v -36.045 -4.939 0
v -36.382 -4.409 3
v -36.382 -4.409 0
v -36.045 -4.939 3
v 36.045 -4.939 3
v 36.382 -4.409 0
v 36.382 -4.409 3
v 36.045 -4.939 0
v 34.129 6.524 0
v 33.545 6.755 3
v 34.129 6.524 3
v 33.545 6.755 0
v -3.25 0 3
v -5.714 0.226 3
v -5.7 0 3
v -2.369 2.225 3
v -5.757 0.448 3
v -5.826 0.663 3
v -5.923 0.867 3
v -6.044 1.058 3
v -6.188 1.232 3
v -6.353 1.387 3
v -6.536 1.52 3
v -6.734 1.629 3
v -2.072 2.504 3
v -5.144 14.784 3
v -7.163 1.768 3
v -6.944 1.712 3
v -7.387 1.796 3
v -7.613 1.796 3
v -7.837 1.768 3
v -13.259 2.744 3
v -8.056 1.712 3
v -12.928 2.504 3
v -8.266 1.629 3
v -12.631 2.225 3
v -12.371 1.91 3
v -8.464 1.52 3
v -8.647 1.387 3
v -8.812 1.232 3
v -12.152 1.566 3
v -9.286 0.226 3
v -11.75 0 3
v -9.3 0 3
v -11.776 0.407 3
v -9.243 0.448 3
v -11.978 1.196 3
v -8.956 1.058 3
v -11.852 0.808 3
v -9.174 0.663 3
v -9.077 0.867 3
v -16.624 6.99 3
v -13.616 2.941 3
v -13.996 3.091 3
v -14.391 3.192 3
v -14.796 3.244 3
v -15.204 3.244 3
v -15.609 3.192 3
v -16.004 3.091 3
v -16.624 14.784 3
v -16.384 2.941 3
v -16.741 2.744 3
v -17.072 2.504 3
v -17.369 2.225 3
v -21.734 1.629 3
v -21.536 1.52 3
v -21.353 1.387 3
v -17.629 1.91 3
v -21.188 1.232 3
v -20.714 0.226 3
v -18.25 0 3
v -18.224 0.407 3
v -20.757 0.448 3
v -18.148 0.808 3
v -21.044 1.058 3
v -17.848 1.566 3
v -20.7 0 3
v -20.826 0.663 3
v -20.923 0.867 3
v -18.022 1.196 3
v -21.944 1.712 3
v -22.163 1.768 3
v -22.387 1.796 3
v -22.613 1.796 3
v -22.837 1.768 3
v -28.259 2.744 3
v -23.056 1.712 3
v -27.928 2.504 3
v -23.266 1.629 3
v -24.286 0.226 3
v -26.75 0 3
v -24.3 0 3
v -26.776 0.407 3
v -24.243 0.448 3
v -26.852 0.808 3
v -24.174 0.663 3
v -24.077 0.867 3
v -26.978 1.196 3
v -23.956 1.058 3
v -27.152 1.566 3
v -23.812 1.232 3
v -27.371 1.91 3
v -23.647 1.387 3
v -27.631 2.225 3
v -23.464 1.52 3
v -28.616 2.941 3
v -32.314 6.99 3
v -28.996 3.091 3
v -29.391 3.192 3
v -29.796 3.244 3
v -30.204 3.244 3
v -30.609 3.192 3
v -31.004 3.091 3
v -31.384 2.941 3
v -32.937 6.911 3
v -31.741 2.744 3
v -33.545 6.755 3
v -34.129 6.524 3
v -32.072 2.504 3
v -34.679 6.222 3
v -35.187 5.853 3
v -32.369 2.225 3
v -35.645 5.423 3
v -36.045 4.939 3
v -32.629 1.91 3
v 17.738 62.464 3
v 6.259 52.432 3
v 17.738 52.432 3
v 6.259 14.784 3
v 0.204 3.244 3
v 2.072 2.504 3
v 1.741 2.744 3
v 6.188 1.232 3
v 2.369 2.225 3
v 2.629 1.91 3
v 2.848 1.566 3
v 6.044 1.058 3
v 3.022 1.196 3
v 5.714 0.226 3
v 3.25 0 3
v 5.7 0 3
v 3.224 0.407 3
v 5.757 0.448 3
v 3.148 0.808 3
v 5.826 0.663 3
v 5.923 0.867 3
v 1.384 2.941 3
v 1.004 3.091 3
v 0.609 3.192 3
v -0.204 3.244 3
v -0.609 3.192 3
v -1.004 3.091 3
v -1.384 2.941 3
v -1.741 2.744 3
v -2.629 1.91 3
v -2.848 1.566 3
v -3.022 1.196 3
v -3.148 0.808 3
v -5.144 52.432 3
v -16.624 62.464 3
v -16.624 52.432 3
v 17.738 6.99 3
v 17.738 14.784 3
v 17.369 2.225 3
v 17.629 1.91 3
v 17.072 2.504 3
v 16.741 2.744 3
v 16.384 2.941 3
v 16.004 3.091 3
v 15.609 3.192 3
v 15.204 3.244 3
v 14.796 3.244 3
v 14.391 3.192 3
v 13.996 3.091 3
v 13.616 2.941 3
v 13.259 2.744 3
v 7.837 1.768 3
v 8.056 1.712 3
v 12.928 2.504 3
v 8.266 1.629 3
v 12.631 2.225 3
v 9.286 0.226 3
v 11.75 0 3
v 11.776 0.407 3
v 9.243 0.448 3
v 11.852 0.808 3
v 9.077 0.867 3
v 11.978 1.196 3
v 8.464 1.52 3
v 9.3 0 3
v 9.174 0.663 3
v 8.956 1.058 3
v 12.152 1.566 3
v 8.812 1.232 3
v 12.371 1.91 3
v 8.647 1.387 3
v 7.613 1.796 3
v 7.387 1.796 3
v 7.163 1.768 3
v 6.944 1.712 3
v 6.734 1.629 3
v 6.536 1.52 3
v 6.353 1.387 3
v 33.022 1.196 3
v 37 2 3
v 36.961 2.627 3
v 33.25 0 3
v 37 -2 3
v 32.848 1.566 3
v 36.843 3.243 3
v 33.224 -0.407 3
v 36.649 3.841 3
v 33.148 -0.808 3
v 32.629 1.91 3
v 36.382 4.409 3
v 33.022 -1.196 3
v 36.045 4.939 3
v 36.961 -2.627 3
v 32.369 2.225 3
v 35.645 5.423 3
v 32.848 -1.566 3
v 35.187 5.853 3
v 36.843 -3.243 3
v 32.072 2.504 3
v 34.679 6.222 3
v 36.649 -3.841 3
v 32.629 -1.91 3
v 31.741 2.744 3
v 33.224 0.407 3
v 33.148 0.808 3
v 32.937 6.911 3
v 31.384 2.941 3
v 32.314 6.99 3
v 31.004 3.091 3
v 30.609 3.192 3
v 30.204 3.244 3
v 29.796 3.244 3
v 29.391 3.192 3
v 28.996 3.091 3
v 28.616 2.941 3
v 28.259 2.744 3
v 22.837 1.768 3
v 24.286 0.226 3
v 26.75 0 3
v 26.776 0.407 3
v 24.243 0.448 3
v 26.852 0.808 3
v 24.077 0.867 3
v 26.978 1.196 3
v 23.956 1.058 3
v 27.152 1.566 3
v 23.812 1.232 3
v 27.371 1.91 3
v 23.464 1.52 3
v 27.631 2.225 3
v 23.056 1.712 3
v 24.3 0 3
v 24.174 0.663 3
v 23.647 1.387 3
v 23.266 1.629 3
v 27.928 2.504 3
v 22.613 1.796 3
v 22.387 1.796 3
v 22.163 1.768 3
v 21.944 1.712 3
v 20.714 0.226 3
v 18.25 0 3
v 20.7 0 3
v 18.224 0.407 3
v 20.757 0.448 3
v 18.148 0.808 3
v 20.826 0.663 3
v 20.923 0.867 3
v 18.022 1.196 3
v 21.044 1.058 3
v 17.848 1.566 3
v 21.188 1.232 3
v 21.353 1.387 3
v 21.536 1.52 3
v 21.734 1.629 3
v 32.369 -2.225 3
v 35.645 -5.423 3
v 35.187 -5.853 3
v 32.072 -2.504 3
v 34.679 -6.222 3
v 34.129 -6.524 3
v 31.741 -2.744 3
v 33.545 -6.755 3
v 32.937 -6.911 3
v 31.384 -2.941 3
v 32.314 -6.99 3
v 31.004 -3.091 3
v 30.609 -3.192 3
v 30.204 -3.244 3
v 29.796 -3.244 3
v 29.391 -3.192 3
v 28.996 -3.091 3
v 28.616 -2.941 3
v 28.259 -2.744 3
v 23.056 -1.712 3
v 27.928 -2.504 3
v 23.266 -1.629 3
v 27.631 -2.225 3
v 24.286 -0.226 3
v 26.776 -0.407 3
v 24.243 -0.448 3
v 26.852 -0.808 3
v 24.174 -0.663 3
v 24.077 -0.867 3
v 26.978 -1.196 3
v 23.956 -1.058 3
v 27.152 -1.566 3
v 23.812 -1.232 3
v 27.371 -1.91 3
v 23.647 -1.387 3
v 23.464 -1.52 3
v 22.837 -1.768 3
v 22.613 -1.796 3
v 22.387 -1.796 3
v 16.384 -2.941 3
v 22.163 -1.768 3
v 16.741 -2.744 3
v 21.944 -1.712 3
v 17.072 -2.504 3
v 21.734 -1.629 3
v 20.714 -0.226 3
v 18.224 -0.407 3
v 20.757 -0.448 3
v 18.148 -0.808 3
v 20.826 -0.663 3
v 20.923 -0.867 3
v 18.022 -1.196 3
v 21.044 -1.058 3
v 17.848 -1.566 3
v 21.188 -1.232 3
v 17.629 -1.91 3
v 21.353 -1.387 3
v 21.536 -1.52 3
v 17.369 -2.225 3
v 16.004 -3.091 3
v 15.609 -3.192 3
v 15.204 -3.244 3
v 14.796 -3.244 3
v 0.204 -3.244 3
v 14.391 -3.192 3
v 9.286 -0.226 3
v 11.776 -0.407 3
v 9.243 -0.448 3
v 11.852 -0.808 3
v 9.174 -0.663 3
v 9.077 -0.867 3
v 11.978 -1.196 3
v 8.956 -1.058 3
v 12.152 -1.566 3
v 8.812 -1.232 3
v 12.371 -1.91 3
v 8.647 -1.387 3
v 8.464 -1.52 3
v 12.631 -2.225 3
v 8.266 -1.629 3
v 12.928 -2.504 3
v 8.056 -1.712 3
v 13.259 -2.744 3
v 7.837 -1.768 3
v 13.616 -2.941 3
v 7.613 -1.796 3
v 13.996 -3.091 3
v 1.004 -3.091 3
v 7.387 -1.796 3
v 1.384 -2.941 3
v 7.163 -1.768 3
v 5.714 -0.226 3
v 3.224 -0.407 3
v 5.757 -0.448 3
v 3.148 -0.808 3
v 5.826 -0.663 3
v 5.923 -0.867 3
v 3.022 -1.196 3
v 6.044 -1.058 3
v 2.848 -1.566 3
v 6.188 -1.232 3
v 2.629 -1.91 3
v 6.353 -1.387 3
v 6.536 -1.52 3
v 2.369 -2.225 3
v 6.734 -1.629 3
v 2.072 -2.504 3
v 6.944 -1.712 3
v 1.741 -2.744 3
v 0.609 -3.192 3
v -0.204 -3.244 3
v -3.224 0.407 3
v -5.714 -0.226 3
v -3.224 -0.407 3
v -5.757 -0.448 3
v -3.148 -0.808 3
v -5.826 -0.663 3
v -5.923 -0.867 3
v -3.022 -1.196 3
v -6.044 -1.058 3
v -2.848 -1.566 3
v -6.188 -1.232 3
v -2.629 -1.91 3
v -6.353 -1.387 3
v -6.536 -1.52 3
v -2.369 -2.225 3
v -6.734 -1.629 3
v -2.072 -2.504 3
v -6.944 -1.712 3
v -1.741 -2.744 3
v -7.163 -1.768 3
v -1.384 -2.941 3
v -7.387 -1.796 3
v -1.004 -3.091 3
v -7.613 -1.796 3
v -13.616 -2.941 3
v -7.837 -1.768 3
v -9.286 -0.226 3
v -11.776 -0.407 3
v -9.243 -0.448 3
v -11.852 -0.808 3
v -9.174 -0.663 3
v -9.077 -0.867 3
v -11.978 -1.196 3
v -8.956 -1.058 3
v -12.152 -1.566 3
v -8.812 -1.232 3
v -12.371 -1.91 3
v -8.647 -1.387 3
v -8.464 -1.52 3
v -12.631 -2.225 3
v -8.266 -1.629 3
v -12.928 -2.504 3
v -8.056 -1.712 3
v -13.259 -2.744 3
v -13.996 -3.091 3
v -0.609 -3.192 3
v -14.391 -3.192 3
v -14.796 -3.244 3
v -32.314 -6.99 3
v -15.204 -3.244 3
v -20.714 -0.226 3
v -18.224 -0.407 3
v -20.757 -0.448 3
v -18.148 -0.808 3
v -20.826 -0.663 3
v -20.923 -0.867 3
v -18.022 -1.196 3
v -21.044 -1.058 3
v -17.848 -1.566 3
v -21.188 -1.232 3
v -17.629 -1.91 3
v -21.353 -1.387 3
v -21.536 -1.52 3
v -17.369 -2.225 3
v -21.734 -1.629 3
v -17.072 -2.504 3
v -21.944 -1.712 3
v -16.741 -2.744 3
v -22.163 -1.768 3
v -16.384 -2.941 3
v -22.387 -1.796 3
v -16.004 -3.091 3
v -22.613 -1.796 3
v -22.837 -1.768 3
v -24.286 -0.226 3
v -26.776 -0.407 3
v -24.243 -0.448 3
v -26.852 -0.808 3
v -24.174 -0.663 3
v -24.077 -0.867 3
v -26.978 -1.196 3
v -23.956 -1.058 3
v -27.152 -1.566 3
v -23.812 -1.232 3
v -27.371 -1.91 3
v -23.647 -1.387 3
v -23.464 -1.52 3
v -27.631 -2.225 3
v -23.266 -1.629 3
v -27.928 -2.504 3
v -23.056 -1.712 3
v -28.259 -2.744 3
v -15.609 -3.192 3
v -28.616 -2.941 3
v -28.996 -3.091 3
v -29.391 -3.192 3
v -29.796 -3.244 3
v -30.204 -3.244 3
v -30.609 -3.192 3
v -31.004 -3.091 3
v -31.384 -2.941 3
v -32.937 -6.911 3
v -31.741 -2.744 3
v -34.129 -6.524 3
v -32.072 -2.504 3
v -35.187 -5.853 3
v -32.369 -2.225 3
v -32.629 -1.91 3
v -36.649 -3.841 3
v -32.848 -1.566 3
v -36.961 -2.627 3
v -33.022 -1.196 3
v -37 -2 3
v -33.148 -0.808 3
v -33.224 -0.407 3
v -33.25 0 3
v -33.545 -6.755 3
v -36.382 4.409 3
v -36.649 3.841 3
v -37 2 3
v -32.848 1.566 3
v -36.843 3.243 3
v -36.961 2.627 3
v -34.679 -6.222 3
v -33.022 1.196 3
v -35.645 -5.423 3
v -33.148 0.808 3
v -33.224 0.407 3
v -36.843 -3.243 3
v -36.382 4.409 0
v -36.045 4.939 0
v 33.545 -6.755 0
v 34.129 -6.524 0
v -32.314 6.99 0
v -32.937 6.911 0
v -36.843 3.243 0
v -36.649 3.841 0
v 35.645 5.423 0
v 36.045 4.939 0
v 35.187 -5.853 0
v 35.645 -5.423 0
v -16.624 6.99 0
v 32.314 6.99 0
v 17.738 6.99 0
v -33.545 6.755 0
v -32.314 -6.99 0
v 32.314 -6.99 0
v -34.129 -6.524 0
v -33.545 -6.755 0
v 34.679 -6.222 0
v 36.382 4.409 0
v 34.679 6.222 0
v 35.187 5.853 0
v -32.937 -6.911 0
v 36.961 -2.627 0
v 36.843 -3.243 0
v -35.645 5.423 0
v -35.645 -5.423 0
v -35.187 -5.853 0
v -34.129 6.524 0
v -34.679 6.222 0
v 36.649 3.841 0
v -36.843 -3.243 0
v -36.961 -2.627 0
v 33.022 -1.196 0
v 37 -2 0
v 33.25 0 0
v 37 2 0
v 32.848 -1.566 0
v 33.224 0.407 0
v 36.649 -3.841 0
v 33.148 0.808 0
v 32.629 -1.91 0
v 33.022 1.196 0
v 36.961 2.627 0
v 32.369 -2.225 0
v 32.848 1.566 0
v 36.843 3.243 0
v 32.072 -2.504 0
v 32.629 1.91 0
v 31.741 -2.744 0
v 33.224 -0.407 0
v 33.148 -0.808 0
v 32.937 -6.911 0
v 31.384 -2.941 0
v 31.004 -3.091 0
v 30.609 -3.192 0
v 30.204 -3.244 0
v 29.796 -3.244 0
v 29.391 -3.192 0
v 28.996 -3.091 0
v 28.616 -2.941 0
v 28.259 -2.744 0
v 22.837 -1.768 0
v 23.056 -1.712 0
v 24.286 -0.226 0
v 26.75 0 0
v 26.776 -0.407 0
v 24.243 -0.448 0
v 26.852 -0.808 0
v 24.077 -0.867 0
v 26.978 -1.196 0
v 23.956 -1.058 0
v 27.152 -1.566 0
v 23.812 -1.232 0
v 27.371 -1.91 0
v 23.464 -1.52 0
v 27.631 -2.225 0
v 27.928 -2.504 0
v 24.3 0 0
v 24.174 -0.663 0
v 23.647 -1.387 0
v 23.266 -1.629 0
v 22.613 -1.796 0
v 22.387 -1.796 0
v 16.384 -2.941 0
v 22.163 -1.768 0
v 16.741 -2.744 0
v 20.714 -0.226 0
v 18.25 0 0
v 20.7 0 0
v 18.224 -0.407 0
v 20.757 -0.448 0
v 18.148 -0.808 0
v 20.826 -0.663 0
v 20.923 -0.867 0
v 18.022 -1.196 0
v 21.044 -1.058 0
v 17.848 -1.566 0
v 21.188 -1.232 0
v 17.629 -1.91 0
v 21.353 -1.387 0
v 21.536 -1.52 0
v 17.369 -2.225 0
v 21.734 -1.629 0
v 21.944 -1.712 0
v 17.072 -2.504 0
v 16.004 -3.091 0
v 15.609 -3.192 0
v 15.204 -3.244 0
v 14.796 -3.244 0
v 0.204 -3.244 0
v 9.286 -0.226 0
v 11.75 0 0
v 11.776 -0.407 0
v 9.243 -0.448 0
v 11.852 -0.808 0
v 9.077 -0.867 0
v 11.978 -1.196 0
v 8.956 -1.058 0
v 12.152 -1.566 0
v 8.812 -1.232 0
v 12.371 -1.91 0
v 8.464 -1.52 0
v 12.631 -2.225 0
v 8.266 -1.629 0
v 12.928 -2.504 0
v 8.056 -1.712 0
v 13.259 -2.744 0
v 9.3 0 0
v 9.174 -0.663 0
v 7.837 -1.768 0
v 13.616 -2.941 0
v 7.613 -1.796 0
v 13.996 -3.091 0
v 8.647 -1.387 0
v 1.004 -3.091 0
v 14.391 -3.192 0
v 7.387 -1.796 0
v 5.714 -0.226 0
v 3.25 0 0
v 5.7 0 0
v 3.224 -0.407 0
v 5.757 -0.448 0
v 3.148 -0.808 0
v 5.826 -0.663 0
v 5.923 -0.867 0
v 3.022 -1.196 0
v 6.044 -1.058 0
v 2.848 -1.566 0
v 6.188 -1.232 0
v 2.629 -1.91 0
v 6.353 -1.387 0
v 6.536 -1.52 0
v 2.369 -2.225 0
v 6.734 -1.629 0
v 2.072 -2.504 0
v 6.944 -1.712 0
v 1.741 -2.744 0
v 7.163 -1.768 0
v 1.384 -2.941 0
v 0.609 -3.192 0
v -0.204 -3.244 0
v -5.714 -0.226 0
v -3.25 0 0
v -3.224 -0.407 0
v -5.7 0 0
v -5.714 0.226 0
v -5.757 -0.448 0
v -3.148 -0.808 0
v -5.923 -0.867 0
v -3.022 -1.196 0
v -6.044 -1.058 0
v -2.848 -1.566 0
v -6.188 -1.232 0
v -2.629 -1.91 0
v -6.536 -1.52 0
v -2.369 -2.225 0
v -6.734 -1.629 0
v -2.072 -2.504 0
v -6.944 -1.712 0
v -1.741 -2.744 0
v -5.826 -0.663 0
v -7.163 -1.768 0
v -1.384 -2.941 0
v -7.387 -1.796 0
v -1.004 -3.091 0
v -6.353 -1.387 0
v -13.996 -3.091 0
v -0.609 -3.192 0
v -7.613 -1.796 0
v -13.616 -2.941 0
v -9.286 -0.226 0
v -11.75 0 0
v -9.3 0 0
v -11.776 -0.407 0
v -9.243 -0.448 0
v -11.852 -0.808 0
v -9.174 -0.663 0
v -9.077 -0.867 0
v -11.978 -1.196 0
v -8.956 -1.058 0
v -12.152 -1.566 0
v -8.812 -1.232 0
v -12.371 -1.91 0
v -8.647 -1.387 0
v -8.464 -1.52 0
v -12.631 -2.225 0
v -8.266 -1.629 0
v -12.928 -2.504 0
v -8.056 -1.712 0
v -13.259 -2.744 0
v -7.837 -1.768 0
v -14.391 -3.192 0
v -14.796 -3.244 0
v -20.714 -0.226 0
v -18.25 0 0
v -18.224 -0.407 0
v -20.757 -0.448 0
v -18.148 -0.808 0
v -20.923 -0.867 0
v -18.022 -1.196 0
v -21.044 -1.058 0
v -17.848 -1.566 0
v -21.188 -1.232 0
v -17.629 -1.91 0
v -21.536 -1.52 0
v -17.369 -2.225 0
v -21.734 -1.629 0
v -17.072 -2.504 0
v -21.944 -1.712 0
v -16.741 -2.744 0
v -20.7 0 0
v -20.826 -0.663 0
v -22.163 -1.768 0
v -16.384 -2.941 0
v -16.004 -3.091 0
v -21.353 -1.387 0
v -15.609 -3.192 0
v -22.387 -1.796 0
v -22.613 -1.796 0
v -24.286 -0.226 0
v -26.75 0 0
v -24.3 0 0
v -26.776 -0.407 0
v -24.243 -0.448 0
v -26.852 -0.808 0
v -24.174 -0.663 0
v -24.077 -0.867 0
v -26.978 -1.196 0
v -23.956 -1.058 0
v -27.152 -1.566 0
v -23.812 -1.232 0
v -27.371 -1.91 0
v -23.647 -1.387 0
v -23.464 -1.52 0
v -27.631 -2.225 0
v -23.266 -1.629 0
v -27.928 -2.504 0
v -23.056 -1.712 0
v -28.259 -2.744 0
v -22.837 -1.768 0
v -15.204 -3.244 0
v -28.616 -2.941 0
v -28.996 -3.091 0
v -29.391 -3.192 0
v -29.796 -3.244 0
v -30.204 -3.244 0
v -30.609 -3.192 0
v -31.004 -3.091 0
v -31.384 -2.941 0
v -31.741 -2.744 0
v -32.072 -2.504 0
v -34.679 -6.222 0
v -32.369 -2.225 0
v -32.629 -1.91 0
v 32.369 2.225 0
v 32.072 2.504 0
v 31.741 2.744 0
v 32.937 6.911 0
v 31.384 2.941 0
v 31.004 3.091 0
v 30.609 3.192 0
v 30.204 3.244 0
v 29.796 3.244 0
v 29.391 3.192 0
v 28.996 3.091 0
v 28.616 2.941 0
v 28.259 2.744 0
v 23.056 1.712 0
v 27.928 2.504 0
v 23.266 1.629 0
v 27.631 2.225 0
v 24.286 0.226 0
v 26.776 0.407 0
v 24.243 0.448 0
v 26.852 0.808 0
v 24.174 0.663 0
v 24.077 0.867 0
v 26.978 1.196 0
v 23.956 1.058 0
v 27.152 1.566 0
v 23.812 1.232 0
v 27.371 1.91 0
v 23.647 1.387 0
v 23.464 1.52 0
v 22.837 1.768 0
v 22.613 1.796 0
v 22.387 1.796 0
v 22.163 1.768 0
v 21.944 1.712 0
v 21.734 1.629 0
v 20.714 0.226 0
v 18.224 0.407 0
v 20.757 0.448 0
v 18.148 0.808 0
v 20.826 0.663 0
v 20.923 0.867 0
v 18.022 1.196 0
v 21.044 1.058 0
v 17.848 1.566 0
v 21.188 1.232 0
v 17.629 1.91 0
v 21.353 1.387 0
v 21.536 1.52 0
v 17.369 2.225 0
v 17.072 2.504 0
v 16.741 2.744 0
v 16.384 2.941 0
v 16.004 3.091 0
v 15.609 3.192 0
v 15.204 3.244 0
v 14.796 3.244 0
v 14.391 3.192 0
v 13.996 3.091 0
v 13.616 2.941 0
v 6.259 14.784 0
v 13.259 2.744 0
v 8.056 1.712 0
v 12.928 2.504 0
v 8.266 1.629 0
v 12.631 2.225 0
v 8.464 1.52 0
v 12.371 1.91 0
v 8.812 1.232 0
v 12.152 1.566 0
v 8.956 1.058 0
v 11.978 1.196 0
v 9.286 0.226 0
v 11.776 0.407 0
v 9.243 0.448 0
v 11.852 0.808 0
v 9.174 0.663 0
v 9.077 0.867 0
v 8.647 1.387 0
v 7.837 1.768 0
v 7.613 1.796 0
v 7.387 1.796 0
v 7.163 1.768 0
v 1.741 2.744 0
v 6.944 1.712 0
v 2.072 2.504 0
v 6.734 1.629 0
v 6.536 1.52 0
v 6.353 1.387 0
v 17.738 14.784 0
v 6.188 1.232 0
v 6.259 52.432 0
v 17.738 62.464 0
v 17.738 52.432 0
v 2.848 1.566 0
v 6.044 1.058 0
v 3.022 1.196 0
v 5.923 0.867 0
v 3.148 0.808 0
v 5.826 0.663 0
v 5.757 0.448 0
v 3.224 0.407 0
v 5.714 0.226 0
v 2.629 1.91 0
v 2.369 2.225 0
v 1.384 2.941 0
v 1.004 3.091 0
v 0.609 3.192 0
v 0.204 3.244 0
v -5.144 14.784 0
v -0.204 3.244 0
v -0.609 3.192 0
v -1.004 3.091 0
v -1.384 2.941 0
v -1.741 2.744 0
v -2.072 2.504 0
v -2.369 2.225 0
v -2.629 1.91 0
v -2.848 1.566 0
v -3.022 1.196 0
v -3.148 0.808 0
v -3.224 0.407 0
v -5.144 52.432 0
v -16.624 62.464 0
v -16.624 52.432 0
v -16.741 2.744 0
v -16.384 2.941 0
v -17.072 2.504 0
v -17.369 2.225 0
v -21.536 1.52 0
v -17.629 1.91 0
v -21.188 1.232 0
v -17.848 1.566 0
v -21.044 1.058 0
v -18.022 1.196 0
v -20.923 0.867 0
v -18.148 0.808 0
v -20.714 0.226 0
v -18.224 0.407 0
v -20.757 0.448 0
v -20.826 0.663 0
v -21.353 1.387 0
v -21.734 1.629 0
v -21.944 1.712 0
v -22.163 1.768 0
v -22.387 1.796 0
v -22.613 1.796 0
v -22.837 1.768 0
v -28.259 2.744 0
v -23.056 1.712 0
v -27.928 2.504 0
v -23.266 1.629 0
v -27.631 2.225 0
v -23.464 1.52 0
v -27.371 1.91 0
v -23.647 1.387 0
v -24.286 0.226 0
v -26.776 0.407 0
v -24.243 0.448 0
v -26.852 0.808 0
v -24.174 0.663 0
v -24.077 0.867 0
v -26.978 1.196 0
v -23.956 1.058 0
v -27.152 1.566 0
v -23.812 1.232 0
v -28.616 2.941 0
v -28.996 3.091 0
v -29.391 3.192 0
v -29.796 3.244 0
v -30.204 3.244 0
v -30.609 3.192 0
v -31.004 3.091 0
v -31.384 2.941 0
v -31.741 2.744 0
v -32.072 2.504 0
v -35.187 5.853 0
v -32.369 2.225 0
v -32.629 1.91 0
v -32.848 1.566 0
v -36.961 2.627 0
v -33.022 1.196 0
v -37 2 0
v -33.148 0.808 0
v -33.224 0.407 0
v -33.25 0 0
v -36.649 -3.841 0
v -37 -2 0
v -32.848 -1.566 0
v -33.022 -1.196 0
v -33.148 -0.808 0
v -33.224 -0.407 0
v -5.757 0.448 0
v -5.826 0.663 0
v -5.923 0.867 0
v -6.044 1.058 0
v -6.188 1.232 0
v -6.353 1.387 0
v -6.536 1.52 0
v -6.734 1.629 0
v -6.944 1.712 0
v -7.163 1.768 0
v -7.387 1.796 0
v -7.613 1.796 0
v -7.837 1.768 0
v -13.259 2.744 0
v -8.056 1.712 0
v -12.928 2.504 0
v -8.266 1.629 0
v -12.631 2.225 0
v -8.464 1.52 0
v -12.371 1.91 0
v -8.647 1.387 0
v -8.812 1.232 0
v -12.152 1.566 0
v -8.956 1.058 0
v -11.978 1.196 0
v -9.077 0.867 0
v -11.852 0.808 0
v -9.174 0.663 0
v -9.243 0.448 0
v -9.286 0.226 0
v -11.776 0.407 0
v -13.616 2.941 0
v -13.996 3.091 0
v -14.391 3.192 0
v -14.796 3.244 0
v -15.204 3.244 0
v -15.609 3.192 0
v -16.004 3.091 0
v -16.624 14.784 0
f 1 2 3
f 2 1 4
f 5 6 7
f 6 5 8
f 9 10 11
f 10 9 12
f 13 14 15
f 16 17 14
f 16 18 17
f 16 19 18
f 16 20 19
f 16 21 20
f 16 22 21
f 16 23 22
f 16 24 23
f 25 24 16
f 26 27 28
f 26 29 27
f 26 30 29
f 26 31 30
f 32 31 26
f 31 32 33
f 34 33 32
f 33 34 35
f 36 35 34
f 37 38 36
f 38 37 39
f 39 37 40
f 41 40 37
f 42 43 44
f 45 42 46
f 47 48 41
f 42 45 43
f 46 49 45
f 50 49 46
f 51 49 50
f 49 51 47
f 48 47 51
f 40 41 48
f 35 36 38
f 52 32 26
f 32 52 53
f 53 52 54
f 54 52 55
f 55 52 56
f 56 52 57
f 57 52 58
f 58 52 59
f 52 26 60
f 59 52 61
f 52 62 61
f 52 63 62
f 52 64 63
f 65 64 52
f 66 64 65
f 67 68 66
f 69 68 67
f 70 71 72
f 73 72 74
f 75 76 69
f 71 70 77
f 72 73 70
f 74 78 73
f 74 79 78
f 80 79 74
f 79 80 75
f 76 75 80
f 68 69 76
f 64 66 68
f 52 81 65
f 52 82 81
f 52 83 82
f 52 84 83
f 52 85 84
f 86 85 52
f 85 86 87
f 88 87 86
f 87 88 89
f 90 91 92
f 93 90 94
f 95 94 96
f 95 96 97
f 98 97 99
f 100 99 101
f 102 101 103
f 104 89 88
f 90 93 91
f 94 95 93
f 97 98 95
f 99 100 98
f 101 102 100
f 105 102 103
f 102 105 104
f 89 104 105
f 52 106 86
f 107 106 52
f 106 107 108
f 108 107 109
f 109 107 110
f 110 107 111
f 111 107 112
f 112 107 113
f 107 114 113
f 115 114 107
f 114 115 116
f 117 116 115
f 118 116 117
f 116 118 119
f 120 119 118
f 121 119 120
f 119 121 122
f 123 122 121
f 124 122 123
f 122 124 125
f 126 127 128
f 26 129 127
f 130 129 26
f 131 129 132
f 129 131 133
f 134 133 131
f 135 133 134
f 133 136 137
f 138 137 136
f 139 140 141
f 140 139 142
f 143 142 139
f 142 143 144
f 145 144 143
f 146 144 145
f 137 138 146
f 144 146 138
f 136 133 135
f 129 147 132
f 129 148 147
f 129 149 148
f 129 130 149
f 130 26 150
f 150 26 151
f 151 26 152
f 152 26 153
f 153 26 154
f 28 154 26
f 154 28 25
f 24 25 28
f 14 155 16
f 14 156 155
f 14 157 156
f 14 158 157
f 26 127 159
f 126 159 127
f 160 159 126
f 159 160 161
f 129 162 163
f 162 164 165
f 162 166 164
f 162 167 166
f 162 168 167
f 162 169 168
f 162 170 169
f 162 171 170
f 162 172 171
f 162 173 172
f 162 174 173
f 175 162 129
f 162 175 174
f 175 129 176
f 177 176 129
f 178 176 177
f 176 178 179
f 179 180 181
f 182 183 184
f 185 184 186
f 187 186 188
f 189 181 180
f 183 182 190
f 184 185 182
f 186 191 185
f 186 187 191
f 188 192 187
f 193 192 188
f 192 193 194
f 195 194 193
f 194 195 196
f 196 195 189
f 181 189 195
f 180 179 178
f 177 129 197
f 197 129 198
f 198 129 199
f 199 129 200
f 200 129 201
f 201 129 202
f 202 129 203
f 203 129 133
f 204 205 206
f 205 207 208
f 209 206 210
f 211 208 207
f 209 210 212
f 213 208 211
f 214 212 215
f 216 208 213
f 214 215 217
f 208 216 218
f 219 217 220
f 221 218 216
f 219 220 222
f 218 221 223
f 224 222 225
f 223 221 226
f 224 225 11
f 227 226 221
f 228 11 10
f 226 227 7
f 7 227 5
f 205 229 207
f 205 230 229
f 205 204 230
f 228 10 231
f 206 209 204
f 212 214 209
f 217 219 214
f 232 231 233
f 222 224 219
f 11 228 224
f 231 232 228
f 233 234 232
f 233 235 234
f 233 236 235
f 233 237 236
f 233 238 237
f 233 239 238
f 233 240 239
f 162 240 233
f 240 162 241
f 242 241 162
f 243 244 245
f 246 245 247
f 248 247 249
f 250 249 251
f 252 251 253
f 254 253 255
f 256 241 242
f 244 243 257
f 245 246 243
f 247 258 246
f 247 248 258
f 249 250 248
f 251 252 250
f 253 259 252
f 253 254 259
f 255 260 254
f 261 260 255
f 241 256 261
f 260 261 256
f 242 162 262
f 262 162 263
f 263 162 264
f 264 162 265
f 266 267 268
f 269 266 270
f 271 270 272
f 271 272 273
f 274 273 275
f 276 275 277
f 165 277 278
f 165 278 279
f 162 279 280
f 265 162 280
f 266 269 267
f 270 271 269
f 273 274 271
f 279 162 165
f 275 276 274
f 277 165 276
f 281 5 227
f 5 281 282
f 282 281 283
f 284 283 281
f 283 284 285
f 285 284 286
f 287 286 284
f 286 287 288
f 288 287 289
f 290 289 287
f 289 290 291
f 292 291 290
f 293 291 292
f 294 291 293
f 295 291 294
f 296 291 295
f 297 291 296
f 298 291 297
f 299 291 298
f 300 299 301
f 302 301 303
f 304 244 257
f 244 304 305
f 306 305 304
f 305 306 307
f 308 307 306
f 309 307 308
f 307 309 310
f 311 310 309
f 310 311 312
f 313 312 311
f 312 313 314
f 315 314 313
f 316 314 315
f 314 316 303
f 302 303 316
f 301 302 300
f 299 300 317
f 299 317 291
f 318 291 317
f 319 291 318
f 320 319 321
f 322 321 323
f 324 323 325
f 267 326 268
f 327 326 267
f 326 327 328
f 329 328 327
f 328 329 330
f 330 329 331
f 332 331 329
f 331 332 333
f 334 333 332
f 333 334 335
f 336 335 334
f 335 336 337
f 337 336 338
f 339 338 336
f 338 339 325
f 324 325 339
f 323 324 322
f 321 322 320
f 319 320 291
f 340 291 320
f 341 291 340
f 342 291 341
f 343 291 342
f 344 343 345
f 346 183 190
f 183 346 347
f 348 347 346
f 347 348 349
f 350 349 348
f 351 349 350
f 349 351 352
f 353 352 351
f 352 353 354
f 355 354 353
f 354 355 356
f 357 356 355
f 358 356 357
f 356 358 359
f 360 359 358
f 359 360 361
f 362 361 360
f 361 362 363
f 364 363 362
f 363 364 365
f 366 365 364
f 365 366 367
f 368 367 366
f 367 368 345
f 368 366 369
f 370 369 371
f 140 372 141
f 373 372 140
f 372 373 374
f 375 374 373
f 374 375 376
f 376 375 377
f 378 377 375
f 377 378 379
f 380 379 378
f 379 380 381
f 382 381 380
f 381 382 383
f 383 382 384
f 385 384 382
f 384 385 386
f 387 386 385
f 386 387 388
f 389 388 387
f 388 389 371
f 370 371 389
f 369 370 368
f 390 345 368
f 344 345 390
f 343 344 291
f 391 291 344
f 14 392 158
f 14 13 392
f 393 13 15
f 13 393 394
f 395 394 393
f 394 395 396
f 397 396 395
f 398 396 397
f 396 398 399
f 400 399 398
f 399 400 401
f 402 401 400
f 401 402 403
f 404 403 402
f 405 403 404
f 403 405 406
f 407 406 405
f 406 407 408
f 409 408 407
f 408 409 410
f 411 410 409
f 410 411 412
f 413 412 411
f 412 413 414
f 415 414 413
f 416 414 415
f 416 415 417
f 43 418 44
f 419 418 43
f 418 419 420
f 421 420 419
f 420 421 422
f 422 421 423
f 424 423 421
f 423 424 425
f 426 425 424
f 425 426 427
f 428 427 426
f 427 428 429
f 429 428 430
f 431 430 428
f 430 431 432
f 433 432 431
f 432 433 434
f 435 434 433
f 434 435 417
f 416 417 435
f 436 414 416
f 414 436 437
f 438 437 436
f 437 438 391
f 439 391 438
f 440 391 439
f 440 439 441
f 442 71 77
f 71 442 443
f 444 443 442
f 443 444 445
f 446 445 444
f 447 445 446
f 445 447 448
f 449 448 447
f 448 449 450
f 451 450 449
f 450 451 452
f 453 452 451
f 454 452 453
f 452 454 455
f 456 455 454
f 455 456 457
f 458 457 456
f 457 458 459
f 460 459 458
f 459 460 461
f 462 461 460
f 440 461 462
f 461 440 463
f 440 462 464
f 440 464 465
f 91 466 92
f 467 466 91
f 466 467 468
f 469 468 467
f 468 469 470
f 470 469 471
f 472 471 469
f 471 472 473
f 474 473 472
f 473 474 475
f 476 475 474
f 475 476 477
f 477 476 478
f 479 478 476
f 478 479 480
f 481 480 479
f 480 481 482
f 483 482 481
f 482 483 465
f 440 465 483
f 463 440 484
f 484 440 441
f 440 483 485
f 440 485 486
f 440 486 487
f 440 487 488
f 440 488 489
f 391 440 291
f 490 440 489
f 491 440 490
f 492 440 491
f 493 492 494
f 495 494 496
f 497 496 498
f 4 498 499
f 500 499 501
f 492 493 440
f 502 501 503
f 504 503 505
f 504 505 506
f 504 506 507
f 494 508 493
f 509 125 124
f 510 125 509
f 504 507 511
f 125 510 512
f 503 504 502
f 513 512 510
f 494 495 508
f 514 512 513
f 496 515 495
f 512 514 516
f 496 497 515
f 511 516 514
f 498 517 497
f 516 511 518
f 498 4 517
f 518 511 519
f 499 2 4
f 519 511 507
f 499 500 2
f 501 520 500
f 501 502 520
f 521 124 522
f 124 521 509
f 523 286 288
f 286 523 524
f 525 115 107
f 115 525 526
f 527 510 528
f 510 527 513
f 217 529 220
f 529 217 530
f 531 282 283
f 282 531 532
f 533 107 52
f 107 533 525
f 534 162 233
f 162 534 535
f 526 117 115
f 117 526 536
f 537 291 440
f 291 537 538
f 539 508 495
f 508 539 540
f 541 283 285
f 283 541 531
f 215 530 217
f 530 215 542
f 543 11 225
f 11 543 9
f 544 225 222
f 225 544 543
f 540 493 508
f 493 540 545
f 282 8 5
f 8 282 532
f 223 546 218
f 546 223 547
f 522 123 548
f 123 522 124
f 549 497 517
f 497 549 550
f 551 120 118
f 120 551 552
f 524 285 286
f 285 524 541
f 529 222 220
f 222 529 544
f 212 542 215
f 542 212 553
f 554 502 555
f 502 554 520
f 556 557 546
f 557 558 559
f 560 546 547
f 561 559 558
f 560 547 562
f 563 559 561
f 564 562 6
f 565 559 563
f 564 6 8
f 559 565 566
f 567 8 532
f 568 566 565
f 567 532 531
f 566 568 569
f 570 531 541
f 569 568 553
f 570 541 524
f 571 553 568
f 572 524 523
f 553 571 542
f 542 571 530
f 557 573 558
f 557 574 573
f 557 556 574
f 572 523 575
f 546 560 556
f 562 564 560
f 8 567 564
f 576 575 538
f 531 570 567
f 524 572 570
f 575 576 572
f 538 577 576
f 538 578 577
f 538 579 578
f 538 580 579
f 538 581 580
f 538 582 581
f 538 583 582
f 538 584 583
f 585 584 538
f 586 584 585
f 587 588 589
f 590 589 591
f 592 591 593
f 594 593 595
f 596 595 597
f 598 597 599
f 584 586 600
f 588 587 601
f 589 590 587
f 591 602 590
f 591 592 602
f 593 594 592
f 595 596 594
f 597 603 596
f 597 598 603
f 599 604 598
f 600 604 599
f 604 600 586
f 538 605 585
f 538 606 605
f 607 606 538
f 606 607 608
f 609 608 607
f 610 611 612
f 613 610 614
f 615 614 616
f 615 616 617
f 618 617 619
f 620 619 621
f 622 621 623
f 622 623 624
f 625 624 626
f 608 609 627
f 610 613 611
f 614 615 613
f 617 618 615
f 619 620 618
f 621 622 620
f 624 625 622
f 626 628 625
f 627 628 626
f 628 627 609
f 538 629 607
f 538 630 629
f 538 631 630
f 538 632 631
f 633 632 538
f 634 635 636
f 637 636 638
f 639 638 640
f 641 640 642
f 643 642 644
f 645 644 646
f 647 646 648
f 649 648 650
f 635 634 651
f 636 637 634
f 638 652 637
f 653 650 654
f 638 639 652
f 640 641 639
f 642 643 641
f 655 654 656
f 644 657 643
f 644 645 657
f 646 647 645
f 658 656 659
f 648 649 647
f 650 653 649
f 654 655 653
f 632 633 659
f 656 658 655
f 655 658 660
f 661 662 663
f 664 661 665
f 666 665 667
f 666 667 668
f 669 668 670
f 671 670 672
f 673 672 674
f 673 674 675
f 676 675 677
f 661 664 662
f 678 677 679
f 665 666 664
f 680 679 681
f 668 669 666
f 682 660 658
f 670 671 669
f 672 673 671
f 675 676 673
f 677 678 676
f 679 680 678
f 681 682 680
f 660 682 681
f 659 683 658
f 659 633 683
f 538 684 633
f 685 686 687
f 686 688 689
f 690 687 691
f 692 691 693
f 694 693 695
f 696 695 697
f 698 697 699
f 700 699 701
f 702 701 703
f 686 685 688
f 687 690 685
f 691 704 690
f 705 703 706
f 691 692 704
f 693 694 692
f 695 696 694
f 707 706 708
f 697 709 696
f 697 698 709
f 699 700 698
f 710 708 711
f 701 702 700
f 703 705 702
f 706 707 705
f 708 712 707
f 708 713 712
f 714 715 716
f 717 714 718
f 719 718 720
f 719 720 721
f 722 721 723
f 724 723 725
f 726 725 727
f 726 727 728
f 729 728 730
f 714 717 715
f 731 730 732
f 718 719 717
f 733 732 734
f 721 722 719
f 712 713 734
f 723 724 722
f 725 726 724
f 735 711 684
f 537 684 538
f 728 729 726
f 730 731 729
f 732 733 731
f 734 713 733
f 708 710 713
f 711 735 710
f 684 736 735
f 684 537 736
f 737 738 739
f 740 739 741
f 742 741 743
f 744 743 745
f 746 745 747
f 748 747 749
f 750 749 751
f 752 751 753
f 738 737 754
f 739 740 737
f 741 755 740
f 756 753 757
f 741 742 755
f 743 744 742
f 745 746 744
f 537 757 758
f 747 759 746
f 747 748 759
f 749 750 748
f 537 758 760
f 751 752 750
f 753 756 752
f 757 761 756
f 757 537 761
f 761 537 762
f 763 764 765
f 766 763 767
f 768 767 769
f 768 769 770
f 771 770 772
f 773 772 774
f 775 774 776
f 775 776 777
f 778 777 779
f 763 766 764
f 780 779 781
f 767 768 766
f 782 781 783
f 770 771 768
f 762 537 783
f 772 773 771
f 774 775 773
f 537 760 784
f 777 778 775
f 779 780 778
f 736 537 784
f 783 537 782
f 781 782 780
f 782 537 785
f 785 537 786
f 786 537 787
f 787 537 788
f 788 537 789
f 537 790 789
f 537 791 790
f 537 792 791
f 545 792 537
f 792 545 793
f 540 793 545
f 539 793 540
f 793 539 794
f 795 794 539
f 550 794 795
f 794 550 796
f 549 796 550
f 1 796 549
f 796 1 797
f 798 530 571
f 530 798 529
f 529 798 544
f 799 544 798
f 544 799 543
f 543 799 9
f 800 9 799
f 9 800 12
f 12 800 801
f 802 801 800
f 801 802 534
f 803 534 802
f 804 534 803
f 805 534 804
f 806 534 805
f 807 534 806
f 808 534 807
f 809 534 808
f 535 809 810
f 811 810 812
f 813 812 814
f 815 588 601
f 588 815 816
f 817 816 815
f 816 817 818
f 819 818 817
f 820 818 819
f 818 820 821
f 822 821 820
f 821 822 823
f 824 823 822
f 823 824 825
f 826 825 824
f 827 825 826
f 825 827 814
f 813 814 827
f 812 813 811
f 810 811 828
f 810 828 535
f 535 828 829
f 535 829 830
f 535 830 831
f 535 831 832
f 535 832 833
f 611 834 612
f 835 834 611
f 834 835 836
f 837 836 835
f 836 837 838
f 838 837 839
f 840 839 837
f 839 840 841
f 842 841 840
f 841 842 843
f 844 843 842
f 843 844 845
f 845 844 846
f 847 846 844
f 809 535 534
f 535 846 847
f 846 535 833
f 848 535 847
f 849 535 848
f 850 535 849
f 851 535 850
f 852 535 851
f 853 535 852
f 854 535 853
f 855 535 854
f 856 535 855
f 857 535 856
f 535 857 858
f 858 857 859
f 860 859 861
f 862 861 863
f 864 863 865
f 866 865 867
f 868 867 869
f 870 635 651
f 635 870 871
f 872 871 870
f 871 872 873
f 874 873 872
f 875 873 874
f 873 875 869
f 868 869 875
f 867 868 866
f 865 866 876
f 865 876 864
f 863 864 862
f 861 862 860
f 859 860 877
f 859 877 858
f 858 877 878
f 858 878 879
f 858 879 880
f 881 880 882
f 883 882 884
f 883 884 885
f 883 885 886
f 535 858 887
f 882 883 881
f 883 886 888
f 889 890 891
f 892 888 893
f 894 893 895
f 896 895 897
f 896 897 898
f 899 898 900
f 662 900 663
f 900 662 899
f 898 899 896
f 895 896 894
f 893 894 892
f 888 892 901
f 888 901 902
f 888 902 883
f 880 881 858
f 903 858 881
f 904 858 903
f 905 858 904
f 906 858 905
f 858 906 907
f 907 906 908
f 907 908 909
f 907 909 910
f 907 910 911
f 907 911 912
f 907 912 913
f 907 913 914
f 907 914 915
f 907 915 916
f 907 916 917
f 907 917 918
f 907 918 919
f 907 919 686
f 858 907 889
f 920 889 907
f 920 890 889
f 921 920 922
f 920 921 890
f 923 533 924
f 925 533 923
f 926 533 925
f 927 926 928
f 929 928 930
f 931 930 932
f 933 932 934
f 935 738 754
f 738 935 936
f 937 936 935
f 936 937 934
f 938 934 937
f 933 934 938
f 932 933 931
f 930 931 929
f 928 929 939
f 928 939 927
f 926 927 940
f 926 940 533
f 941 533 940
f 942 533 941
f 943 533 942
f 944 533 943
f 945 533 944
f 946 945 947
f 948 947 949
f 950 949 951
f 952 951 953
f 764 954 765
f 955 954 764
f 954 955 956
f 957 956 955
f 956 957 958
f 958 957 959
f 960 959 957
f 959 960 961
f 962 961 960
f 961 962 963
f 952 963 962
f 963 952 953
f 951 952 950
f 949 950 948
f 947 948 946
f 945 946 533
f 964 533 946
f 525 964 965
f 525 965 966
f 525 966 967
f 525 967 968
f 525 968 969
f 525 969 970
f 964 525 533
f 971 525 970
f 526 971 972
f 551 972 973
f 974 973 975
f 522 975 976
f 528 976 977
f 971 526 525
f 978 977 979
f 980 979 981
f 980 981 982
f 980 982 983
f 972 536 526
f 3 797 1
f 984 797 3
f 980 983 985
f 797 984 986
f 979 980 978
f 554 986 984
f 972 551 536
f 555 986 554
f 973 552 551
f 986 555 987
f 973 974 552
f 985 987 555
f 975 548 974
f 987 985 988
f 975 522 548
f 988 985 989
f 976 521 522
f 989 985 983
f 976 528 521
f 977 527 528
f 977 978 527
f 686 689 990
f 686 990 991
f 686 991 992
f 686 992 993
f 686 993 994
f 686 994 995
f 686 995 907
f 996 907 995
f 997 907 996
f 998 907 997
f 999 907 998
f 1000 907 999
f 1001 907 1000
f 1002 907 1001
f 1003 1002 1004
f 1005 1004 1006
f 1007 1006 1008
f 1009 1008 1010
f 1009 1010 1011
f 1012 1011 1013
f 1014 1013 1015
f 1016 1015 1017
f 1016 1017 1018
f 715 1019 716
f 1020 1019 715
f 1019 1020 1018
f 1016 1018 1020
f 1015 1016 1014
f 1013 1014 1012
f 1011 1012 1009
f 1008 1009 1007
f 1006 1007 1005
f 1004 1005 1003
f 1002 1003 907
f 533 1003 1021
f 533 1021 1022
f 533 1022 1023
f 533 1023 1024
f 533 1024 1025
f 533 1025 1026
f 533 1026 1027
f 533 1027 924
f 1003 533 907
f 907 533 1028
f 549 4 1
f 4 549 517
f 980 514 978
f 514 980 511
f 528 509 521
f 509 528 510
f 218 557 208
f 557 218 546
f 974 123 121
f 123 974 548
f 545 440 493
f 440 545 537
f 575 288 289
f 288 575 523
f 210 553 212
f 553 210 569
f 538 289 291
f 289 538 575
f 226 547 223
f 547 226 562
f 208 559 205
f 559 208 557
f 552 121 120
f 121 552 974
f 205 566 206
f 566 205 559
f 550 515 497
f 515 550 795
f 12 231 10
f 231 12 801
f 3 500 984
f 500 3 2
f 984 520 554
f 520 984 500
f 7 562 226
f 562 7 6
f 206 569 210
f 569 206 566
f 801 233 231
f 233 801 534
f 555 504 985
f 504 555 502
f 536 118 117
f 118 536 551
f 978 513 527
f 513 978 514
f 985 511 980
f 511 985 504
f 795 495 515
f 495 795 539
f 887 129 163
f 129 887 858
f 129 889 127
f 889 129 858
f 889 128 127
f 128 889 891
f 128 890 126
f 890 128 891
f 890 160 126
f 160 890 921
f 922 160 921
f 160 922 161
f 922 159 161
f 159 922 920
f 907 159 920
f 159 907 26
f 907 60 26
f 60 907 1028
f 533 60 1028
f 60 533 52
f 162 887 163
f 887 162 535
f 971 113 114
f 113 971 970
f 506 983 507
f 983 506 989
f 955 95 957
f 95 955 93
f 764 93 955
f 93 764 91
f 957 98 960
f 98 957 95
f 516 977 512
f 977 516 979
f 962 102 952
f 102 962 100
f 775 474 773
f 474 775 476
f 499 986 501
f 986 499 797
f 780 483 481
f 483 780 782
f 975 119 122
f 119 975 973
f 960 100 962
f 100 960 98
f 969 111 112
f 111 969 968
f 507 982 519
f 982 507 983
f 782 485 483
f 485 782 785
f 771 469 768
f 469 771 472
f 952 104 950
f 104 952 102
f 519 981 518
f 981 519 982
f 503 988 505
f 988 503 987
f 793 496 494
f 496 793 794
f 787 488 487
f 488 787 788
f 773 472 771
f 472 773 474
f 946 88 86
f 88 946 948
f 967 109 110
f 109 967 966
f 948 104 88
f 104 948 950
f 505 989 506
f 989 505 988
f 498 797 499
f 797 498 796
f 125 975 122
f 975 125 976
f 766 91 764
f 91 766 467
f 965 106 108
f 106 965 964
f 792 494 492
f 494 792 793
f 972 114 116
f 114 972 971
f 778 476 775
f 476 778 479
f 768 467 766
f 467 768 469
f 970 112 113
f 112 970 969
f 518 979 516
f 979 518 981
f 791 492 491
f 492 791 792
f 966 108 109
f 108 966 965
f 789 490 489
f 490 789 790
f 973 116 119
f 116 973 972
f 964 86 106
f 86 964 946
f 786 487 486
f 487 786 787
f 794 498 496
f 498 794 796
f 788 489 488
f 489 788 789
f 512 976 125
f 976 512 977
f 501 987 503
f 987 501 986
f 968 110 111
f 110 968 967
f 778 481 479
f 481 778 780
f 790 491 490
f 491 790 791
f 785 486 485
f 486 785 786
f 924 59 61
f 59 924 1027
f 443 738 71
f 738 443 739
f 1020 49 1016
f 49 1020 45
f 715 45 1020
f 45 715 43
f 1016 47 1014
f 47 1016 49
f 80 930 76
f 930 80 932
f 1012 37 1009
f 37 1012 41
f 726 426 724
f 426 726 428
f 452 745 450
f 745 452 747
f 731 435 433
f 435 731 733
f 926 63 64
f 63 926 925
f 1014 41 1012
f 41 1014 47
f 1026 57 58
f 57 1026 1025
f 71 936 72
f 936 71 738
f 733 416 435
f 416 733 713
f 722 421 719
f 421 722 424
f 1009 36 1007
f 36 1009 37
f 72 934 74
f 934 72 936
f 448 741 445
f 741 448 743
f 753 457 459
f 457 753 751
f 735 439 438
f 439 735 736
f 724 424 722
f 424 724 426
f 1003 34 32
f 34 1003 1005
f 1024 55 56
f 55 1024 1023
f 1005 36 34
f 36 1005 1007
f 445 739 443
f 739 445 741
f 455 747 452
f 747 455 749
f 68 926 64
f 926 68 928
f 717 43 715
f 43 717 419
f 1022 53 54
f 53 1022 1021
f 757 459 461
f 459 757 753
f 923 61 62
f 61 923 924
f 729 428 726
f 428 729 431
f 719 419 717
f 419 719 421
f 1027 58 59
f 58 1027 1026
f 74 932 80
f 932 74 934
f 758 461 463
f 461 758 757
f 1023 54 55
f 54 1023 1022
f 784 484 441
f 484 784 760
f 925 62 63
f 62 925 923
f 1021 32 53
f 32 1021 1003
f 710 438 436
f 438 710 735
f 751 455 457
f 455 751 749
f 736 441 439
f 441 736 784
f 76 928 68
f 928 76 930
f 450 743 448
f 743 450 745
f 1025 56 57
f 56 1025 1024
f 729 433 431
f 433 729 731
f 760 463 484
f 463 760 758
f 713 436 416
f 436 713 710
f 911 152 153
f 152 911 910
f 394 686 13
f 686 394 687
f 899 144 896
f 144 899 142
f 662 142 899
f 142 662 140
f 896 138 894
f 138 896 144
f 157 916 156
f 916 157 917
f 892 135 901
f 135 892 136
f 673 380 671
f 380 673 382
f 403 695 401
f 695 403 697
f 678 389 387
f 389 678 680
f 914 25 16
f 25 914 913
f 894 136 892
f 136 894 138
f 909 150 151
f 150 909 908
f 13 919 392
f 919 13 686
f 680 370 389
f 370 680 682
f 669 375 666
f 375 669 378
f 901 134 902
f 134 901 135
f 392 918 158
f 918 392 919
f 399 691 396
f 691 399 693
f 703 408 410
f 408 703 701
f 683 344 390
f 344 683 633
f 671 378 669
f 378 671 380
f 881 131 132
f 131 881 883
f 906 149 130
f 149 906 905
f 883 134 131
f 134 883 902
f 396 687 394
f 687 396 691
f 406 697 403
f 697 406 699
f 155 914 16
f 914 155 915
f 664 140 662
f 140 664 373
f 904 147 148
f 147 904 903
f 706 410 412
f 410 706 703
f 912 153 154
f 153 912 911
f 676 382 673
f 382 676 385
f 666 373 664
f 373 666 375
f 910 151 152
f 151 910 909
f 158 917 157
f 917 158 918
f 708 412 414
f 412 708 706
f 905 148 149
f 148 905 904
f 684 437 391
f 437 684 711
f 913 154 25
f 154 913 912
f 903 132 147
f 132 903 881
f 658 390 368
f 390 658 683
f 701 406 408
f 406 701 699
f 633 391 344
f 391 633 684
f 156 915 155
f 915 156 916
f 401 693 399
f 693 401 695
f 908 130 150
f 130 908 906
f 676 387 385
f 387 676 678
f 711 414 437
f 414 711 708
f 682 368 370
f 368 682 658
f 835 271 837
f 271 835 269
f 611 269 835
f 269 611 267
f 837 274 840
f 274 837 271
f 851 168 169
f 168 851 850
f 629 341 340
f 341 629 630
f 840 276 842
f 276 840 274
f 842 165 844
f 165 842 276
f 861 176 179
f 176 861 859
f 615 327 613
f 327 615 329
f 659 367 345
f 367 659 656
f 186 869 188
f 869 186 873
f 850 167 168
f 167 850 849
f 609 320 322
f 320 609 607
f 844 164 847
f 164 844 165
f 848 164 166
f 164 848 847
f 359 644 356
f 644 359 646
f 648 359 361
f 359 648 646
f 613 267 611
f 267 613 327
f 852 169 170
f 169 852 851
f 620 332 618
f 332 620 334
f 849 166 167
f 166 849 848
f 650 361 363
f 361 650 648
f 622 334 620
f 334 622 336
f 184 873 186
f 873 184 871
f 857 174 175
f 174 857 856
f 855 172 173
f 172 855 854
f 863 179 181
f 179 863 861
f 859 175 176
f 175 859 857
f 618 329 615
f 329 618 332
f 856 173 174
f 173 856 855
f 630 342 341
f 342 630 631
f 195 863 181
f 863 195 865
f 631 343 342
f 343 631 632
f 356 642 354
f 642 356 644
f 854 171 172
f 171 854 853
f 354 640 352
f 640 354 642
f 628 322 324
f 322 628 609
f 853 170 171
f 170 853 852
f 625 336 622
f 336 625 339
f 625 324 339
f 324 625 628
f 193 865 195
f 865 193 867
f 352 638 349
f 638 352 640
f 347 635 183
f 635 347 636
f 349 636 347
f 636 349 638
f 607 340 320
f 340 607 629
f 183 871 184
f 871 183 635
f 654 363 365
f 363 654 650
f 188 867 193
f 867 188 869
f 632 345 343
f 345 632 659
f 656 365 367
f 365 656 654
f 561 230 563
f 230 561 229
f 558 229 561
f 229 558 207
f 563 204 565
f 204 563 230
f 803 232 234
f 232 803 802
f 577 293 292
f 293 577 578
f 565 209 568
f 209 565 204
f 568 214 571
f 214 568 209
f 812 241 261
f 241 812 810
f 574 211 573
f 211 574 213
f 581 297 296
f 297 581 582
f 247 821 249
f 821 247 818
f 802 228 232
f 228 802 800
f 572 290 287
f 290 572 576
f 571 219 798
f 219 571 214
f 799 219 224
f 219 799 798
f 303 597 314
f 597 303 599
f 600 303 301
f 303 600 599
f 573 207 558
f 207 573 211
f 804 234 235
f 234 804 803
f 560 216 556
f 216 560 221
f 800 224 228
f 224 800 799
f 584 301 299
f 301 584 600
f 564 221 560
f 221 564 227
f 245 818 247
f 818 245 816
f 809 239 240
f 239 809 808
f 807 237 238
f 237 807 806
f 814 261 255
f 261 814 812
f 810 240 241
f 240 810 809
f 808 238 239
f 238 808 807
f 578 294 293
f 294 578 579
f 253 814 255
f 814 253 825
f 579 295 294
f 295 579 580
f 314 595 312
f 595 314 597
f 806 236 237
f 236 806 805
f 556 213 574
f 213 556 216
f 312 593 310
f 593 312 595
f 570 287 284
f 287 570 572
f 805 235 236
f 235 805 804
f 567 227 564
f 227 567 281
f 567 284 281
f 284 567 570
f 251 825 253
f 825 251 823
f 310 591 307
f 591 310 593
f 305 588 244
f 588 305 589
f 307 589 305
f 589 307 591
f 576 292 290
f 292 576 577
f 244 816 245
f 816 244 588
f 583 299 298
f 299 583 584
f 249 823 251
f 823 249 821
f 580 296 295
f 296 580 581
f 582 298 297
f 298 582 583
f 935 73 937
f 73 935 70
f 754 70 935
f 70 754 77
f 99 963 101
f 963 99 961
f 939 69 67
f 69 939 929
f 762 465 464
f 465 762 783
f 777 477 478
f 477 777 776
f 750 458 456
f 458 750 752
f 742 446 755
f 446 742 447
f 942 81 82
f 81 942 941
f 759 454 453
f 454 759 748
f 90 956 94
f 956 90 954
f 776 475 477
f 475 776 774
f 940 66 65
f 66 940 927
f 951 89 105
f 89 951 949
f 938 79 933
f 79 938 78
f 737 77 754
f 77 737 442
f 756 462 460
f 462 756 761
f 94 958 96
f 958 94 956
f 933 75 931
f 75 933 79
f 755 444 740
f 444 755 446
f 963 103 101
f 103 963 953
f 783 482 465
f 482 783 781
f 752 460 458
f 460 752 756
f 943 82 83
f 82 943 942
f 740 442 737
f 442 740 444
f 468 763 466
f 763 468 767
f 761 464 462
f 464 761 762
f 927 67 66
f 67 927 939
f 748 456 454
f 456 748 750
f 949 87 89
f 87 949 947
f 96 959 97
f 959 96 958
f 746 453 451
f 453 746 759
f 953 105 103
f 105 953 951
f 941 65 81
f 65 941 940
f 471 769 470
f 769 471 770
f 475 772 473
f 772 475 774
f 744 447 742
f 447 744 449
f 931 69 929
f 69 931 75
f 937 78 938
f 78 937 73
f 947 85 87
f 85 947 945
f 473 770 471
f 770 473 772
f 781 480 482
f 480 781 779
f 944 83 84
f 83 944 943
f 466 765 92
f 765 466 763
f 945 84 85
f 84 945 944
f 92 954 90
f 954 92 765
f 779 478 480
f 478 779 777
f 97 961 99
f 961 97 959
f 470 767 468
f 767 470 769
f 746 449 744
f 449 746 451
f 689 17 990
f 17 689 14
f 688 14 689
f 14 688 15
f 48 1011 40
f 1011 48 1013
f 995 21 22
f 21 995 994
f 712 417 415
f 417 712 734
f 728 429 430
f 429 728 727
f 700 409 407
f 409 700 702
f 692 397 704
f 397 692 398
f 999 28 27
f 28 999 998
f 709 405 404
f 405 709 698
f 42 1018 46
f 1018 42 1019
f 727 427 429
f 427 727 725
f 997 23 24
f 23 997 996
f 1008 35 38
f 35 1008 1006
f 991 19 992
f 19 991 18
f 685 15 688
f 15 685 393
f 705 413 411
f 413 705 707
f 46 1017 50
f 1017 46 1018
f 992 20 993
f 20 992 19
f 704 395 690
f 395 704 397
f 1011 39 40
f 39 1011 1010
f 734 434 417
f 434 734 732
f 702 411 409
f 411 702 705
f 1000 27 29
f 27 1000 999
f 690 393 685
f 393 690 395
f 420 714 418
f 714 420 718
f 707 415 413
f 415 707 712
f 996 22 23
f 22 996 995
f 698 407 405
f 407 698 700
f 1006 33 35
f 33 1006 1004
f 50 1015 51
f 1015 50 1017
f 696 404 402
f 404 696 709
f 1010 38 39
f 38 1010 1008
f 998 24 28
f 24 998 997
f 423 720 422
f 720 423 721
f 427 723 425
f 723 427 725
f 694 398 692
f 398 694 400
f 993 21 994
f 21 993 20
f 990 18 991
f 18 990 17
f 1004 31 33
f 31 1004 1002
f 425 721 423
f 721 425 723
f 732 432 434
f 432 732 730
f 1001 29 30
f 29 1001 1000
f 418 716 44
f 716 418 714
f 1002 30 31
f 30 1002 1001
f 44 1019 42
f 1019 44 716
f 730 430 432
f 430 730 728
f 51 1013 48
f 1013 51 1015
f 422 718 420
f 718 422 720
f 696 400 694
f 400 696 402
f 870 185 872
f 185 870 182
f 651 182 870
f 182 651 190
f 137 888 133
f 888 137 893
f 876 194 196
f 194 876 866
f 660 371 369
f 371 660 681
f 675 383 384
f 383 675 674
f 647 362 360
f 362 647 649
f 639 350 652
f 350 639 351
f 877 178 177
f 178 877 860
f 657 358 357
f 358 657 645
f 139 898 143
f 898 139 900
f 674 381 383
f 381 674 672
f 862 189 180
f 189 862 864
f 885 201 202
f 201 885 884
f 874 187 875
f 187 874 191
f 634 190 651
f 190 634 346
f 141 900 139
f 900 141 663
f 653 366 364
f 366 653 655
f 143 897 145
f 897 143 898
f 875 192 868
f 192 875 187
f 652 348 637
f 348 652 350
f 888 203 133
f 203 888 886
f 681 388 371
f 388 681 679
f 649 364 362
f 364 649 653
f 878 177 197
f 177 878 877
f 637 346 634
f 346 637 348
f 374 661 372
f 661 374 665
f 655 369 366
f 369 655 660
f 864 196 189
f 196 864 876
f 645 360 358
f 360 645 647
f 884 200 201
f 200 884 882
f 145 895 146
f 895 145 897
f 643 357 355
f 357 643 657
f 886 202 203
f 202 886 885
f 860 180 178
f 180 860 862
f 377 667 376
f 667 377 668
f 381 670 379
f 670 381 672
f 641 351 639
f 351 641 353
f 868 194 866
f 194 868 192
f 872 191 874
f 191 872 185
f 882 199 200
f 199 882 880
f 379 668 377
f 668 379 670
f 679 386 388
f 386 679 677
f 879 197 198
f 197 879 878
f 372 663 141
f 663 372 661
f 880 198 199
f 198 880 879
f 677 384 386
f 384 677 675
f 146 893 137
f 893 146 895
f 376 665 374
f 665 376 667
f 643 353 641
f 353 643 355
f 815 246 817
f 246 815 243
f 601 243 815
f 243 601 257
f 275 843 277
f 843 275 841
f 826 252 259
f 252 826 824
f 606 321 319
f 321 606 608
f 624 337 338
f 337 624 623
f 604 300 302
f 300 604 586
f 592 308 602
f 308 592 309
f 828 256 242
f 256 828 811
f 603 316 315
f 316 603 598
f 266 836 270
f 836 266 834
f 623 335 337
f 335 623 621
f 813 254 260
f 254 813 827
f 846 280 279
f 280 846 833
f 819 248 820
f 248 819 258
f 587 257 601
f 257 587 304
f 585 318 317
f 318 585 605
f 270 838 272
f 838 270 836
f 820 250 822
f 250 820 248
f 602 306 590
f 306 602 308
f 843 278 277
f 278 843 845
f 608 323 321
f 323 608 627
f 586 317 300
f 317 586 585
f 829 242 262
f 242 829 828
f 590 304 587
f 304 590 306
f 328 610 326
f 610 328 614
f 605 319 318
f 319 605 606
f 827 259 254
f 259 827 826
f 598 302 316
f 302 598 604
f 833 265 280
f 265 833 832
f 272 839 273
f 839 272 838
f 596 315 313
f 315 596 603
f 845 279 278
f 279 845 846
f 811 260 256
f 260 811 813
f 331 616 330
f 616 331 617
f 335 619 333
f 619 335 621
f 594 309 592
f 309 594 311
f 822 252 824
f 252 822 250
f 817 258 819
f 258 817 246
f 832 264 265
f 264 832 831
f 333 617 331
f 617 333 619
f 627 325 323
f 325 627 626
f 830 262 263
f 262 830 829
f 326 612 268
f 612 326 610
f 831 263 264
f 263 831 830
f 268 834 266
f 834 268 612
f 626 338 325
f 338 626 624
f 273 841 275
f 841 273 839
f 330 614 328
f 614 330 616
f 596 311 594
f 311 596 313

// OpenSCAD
$fn = 50;


difference() {
	union() {
		hull() {
			translate(v = [-32.0000000000, 2.0000000000, 0]) {
				cylinder(h = 3, r = 5);
			}
			translate(v = [32.0000000000, 2.0000000000, 0]) {
				cylinder(h = 3, r = 5);
			}
			translate(v = [-32.0000000000, -2.0000000000, 0]) {
				cylinder(h = 3, r = 5);
			}
			translate(v = [32.0000000000, -2.0000000000, 0]) {
				cylinder(h = 3, r = 5);
			}
		}
		translate(v = [0, 61.1111111111, 0]) {
			linear_extrude(height = 3) {
				text(font = "DejaVu Sans Mono:style=Bold", halign = "center", size = 57.0000000000, text = "I", valign = "top");
			}
		}
	}
	union() {
		translate(v = [-30.0000000000, 0.0000000000, 0]) {
			translate(v = [0, 0, -100]) {
				cylinder(h = 200, r = 3.2500000000);
			}
		}
		translate(v = [-15.0000000000, 0.0000000000, 0]) {
			translate(v = [0, 0, -100]) {
				cylinder(h = 200, r = 3.2500000000);
			}
		}
		translate(v = [0, 0, -100]) {
			cylinder(h = 200, r = 3.2500000000);
		}
		translate(v = [15.0000000000, 0.0000000000, 0]) {
			translate(v = [0, 0, -100]) {
				cylinder(h = 200, r = 3.2500000000);
			}
		}
		translate(v = [30.0000000000, 0.0000000000, 0]) {
			translate(v = [0, 0, -100]) {
				cylinder(h = 200, r = 3.2500000000);
			}
		}
		translate(v = [-30.0000000000, 0.0000000000, 0]) {
			translate(v = [0, 0, -100]) {
				cylinder(h = 200, r = 1.8000000000);
			}
		}
		translate(v = [-22.5000000000, 0.0000000000, 0]) {
			translate(v = [0, 0, -100]) {
				cylinder(h = 200, r = 1.8000000000);
			}
		}
		translate(v = [-15.0000000000, 0.0000000000, 0]) {
			translate(v = [0, 0, -100]) {
				cylinder(h = 200, r = 1.8000000000);
			}
		}
		translate(v = [-7.5000000000, 0.0000000000, 0]) {
			translate(v = [0, 0, -100]) {
				cylinder(h = 200, r = 1.8000000000);
			}
		}
		translate(v = [0, 0, -100]) {
			cylinder(h = 200, r = 1.8000000000);
		}
		translate(v = [7.5000000000, 0.0000000000, 0]) {
			translate(v = [0, 0, -100]) {
				cylinder(h = 200, r = 1.8000000000);
			}
		}
		translate(v = [15.0000000000, 0.0000000000, 0]) {
			translate(v = [0, 0, -100]) {
				cylinder(h = 200, r = 1.8000000000);
			}
		}
		translate(v = [22.5000000000, 0.0000000000, 0]) {
			translate(v = [0, 0, -100]) {
				cylinder(h = 200, r = 1.8000000000);
			}
		}
		translate(v = [30.0000000000, 0.0000000000, 0]) {
			translate(v = [0, 0, -100]) {
				cylinder(h = 200, r = 1.8000000000);
			}
		}
	}
}
